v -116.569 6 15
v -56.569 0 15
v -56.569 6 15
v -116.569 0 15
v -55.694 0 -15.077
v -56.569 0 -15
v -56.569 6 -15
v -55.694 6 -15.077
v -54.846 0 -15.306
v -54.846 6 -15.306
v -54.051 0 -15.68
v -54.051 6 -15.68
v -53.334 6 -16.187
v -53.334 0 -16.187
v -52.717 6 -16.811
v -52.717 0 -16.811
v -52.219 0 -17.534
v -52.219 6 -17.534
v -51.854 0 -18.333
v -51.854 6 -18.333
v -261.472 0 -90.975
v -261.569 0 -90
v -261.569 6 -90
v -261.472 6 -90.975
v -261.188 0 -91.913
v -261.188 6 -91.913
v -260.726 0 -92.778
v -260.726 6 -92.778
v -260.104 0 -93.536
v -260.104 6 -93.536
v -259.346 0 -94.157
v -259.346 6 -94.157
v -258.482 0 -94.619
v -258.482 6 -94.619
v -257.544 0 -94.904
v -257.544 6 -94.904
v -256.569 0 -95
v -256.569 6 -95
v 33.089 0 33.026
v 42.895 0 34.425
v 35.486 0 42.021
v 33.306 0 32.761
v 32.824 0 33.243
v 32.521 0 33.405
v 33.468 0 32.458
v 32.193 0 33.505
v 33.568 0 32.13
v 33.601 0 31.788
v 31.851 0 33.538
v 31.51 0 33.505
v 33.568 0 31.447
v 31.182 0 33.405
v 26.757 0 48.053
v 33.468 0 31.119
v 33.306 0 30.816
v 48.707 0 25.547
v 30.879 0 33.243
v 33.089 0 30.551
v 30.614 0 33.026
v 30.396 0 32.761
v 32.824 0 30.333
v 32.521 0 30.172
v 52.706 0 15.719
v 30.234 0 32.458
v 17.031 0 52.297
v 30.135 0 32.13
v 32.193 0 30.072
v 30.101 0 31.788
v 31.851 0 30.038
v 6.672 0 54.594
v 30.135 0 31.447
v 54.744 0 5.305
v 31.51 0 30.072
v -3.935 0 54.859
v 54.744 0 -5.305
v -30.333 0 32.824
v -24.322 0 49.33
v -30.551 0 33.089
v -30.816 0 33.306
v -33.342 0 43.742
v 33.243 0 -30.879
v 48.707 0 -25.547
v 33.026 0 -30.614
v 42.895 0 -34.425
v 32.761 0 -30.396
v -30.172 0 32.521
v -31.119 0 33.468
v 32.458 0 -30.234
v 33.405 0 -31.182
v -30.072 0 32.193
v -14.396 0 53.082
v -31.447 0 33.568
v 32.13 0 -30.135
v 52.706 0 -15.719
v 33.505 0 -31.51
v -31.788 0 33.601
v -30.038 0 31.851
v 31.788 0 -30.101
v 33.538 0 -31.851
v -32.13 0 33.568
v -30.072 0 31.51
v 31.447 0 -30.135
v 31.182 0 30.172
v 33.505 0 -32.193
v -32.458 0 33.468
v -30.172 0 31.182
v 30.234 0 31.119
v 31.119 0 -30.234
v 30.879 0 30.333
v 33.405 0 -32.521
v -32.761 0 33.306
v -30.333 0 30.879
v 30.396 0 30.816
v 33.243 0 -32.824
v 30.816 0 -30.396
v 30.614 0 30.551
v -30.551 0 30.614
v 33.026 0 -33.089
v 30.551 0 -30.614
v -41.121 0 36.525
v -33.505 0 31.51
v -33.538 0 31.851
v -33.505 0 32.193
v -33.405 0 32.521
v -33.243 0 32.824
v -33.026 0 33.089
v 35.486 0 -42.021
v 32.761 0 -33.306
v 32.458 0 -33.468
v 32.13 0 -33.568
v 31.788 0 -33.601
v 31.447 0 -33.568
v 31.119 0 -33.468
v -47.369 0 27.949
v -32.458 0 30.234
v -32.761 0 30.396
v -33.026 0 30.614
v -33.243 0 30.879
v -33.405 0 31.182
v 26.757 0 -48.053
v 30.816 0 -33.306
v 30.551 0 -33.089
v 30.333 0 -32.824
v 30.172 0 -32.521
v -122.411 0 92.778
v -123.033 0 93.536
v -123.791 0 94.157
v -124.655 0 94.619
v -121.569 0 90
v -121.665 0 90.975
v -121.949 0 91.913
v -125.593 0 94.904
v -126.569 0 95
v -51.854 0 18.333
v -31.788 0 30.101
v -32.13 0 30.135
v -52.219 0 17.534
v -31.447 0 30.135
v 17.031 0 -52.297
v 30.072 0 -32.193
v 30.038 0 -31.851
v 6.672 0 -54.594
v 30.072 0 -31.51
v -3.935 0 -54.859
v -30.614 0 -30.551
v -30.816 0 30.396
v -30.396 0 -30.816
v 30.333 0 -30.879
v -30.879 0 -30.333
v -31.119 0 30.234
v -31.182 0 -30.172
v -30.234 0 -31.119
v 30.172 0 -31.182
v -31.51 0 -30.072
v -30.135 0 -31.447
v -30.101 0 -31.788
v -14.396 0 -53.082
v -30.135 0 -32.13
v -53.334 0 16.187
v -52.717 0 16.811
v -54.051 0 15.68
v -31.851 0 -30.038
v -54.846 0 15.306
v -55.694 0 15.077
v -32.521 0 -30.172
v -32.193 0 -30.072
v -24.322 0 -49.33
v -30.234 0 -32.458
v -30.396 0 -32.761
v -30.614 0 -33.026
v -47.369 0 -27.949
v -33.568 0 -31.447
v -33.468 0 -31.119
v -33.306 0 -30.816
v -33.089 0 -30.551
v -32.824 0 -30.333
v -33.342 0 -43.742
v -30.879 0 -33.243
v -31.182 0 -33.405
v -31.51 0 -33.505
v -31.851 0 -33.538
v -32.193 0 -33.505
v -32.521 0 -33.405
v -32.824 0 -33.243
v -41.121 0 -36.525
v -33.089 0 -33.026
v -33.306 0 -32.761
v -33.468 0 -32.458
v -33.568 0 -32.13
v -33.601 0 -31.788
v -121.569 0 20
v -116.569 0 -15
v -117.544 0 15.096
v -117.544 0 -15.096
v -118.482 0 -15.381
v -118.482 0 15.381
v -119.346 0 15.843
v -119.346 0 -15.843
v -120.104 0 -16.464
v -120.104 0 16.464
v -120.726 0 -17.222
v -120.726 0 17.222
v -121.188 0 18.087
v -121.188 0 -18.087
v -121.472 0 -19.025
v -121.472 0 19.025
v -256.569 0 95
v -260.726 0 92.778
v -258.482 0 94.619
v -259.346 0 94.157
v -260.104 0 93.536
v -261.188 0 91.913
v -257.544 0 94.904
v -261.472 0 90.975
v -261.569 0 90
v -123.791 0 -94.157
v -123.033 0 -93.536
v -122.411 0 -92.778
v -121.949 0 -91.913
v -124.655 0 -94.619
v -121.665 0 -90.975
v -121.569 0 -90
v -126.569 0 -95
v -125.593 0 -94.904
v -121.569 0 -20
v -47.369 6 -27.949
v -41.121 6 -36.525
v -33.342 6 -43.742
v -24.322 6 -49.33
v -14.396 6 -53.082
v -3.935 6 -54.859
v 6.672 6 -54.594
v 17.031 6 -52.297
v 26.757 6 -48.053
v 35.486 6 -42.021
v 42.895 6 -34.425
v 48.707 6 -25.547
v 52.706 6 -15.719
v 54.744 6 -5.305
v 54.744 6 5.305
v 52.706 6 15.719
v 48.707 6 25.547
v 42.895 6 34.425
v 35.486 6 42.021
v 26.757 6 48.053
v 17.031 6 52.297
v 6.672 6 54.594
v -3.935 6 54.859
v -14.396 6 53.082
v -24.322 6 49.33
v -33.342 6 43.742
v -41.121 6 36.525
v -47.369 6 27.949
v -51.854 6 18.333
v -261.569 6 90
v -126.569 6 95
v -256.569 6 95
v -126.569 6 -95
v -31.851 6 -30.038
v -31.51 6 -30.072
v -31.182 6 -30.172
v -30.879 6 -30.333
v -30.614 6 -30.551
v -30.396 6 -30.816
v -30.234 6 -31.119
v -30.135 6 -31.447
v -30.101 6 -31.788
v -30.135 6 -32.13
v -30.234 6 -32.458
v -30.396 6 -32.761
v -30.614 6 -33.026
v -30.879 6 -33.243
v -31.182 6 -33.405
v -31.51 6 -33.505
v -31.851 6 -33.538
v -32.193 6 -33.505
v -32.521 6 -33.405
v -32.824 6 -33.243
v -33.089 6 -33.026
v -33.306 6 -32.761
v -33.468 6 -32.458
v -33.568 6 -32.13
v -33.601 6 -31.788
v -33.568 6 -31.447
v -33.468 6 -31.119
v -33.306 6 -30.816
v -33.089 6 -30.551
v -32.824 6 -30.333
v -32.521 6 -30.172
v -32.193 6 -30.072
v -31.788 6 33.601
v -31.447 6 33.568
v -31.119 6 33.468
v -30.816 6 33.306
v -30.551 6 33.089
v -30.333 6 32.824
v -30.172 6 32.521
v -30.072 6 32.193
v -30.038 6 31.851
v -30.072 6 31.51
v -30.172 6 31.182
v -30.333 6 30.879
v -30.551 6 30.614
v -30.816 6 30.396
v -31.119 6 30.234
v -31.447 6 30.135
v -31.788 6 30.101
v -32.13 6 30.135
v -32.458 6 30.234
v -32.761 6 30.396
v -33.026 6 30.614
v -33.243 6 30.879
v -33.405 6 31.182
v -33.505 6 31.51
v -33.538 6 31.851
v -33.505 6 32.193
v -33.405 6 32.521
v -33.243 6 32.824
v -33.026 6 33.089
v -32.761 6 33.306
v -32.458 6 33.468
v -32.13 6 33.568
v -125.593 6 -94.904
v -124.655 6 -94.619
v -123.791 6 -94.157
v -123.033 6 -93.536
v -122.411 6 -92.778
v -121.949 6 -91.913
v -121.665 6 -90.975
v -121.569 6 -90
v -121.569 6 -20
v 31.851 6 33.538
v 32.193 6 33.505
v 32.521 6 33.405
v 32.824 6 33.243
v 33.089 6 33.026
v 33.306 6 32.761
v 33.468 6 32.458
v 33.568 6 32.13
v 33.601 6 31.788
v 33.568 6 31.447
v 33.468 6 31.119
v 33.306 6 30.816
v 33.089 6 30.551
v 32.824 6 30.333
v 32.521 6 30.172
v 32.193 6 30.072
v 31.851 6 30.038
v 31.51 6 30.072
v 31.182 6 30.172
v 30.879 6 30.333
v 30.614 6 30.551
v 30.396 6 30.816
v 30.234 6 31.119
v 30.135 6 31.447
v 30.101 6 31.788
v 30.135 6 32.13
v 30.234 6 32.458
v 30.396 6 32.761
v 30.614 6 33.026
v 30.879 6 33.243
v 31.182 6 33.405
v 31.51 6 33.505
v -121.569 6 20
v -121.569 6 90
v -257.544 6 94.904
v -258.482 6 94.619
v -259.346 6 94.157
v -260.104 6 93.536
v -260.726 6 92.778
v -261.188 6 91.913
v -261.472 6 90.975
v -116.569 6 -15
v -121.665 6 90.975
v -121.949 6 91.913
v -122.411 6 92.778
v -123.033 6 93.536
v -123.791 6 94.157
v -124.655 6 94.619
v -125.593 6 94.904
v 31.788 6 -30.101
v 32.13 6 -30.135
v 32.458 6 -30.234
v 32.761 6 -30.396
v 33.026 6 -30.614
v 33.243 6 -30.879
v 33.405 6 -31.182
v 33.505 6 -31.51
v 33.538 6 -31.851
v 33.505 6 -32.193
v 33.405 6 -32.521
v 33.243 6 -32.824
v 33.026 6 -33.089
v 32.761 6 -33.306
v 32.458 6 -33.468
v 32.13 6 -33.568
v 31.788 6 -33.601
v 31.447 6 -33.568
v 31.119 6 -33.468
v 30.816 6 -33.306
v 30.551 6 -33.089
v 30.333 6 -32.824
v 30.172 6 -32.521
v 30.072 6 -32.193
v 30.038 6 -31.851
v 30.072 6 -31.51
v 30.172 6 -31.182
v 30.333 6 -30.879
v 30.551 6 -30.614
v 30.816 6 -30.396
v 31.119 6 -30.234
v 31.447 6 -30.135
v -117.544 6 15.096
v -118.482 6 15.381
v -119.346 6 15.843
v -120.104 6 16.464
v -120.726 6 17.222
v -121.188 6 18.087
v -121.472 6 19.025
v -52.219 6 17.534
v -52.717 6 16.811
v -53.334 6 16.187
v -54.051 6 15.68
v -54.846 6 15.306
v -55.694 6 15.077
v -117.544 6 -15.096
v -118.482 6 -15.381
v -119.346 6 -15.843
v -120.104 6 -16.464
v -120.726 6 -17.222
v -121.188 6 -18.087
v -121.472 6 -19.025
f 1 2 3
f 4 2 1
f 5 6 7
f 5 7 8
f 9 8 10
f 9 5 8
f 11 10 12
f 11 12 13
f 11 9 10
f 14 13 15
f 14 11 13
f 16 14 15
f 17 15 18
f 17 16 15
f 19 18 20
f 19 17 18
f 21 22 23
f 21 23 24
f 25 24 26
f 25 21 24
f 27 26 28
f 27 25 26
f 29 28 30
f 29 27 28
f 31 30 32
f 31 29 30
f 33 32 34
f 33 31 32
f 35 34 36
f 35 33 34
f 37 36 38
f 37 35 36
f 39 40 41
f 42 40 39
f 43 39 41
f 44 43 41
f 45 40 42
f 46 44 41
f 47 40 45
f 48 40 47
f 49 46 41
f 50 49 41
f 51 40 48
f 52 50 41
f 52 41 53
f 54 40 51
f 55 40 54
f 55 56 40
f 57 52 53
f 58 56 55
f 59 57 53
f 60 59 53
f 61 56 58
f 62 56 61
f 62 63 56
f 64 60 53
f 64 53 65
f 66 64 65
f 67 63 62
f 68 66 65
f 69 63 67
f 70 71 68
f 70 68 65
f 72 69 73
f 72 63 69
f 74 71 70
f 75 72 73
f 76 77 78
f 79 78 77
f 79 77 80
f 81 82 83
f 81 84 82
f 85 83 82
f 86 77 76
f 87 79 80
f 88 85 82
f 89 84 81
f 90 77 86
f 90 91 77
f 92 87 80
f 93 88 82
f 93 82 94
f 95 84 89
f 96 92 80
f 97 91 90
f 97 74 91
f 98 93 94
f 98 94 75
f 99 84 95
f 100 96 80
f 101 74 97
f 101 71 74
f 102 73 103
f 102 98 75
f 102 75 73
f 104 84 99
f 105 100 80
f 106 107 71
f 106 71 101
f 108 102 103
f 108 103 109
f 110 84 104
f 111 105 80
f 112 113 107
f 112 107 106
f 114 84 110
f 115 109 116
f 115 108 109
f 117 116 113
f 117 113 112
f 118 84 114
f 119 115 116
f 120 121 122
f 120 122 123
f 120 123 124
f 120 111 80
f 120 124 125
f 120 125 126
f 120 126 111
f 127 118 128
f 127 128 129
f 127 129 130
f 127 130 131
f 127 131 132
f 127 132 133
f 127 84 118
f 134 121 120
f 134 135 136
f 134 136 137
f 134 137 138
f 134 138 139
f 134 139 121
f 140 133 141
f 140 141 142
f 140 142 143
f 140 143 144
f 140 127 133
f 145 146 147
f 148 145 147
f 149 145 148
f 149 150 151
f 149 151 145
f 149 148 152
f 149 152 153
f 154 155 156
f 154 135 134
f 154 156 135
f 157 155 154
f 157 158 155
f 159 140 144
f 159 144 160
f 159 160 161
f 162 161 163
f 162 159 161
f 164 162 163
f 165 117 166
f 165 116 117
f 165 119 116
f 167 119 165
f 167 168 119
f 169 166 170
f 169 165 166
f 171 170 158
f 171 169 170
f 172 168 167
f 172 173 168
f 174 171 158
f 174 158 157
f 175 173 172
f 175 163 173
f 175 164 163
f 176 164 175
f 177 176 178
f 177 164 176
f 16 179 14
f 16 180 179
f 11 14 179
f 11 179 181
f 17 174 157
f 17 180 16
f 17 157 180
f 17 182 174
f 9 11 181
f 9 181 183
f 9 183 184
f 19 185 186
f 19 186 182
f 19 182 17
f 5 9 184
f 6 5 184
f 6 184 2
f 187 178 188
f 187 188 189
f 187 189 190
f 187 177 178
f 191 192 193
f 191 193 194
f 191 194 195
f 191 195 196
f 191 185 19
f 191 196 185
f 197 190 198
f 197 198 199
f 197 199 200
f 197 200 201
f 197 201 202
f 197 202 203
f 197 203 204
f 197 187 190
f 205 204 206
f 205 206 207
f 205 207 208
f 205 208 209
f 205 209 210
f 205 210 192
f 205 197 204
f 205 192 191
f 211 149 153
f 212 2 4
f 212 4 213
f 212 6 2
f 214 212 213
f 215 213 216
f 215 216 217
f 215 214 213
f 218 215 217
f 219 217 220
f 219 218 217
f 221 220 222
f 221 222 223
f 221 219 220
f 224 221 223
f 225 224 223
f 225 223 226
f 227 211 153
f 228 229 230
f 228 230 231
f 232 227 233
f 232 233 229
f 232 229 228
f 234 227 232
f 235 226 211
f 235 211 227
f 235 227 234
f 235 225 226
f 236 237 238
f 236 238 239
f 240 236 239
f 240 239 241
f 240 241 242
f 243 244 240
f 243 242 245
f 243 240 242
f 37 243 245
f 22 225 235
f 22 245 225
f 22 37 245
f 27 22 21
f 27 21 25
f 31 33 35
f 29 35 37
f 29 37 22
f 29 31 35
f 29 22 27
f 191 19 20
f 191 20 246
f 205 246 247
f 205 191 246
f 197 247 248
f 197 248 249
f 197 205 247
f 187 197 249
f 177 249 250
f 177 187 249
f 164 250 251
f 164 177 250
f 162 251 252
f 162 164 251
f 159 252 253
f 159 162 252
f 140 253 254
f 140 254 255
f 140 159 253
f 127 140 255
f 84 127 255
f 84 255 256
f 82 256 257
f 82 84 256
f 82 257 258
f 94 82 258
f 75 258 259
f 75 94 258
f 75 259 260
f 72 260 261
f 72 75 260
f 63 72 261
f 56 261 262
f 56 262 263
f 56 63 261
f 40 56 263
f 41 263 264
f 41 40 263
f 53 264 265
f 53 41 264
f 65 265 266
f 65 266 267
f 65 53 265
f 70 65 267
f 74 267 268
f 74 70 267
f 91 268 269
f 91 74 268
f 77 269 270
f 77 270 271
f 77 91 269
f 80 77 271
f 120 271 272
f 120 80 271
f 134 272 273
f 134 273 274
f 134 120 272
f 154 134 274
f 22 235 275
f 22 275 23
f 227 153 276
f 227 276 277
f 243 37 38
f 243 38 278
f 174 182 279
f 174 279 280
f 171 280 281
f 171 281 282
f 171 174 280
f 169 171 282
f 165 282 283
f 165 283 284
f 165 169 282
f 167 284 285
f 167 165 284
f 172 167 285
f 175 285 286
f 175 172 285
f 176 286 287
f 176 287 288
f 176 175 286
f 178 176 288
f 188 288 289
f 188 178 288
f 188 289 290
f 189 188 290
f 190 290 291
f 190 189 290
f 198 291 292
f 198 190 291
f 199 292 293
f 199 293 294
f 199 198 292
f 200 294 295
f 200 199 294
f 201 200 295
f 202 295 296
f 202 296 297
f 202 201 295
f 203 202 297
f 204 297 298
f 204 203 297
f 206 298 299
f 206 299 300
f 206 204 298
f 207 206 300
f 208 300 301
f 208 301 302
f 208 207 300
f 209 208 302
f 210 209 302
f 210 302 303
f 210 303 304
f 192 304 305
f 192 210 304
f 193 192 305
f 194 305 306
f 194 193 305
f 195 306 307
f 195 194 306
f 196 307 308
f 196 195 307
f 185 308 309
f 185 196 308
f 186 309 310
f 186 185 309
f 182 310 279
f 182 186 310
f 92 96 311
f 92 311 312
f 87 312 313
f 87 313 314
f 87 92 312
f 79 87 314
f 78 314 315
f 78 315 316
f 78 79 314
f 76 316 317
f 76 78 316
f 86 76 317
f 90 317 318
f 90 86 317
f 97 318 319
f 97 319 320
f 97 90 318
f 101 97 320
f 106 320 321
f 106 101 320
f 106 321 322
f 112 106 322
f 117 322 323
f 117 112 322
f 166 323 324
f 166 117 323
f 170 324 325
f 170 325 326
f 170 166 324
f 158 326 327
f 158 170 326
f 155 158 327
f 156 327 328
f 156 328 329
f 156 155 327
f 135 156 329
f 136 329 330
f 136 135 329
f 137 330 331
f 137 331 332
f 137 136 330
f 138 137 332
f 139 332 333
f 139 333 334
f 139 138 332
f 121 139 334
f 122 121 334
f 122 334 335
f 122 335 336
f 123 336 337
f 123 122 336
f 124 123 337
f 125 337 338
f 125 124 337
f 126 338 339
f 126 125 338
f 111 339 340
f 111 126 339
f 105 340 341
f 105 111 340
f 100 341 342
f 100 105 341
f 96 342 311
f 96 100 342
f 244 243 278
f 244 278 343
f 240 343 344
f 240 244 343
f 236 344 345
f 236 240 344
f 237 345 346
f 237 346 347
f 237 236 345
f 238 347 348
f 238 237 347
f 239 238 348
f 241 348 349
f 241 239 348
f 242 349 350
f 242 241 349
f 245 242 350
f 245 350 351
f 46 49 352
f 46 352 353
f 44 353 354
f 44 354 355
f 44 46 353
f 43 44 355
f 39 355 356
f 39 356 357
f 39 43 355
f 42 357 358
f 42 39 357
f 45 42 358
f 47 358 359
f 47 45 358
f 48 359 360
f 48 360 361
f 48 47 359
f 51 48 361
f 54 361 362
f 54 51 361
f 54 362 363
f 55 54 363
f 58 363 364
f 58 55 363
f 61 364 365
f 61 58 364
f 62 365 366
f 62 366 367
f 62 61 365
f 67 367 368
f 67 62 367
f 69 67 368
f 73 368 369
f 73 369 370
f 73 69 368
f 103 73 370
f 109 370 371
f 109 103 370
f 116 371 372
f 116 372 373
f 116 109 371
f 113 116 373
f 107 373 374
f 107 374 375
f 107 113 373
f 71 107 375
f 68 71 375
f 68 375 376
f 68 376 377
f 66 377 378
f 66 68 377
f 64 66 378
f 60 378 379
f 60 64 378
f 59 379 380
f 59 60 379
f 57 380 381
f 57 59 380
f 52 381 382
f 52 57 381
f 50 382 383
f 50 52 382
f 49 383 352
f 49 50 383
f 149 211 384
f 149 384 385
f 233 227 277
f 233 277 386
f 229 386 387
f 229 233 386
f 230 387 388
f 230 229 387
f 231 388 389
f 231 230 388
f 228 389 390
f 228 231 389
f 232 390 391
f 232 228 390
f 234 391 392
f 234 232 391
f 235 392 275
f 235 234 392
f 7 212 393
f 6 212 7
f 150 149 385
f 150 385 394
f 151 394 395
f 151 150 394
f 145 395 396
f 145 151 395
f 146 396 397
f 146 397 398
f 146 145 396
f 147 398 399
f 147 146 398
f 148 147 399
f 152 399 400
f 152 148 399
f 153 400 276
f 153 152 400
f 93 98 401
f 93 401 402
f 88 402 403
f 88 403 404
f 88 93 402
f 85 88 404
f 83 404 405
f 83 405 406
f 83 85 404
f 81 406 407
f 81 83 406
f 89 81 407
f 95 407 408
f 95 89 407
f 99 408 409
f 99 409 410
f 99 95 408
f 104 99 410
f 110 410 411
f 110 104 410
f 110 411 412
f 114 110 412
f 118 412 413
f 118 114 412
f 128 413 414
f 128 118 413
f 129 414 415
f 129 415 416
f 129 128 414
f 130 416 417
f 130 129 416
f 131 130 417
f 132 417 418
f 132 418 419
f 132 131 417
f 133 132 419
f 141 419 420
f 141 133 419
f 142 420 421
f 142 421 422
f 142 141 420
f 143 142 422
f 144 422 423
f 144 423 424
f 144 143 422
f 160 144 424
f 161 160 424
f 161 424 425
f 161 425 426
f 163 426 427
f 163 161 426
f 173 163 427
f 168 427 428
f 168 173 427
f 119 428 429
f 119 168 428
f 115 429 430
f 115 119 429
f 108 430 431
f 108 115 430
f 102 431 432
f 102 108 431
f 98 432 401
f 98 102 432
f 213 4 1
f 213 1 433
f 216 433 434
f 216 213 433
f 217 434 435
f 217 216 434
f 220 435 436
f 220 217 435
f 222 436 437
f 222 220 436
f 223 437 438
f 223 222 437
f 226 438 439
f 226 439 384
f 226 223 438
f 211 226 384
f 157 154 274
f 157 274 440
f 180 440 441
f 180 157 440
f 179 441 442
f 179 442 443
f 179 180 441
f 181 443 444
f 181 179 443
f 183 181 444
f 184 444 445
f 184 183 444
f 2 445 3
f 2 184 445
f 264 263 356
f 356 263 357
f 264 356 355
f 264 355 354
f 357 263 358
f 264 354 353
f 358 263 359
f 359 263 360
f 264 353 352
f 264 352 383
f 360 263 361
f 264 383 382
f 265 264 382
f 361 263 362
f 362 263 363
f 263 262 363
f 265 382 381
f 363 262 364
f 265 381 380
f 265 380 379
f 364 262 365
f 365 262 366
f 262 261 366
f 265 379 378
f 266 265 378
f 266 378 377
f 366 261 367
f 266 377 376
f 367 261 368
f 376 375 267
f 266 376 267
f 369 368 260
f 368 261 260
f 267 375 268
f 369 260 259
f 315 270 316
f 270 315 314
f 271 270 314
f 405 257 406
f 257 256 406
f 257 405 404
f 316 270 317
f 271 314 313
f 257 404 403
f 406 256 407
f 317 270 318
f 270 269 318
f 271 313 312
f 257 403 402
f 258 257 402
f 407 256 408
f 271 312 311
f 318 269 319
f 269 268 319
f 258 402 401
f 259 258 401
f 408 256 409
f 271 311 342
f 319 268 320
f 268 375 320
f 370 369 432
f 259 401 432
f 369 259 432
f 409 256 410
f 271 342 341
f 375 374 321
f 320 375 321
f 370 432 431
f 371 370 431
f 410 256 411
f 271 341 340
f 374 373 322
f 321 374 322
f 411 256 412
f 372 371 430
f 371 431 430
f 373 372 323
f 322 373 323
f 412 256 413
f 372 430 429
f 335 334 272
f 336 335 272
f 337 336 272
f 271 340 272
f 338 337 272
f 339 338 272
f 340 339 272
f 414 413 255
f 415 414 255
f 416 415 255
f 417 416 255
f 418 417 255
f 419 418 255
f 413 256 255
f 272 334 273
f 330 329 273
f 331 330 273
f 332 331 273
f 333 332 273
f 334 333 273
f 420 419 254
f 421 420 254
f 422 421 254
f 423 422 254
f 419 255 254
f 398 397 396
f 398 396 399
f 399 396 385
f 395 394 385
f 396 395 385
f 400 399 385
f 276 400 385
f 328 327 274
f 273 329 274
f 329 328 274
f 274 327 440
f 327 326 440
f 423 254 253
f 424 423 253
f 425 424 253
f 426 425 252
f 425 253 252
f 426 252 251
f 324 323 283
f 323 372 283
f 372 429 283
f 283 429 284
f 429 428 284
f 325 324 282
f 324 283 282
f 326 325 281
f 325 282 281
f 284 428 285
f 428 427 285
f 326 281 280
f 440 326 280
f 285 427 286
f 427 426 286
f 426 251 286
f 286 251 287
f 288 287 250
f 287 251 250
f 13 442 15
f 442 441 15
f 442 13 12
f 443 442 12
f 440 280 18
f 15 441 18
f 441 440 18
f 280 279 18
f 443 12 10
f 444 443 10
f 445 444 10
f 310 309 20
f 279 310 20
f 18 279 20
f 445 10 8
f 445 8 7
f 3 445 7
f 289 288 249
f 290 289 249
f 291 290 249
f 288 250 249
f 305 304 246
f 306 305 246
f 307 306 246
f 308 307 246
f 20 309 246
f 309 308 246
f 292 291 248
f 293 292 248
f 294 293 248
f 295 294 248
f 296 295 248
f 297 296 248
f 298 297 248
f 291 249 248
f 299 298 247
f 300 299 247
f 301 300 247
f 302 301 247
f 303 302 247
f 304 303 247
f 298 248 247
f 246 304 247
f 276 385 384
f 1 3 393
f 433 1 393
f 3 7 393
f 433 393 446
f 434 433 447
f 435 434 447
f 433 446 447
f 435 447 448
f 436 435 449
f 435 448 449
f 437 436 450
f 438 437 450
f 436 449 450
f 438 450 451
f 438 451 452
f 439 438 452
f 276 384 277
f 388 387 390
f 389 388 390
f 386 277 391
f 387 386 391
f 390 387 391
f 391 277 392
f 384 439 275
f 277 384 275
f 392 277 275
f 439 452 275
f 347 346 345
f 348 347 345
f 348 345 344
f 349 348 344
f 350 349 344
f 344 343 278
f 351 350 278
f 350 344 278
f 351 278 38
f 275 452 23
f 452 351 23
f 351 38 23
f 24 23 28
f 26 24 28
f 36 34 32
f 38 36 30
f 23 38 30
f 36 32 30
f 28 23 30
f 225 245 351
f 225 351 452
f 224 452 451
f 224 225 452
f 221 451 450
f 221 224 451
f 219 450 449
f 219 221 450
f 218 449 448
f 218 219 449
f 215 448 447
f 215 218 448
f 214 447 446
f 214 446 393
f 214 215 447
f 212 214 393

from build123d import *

# Parameters (mm, degrees)
SKETCH1_R           = 1.75
BOSS_EXTRUDE1_DEPTH = 6


with BuildPart() as part:
    # Sketch1 → Boss-Extrude1 (new body)
    with BuildSketch(Plane(origin=(0, 0, 0), x_dir=(1, 0, 0), z_dir=(0, 1, 0))):
        with BuildLine():
            Line((-56.568542495, -15), (-116.568542495, -15))
            ThreePointArc((-116.568542495, -15), (-120.104076401, -16.464466094), (-121.568542495, -20))
            Line((-121.568542495, -20), (-121.568542495, -90))
            ThreePointArc((-121.568542495, -90), (-123.033008589, -93.535533906), (-126.568542495, -95))
            Line((-126.568542495, -95), (-256.568542495, -95))
            ThreePointArc((-256.568542495, -95), (-260.104076401, -93.535533906), (-261.568542495, -90))
            Line((-261.568542495, -90), (-261.568542495, 90))
            ThreePointArc((-261.568542495, 90), (-260.104076401, 93.535533906), (-256.568542495, 95))
            Line((-256.568542495, 95), (-126.568542495, 95))
            ThreePointArc((-126.568542495, 95), (-123.033008589, 93.535533906), (-121.568542495, 90))
            Line((-121.568542495, 90), (-121.568542495, 20))
            ThreePointArc((-121.568542495, 20), (-120.104076401, 16.464466094), (-116.568542495, 15))
            Line((-116.568542495, 15), (-56.568542495, 15))
            ThreePointArc((-56.568542495, 15), (-53.681791149, 15.917517095), (-51.854497287, 18.333333333))
            ThreePointArc((-51.854497287, 18.333333333), (55, 0), (-51.854497287, -18.333333333))
            ThreePointArc((-51.854497287, -18.333333333), (-53.681791149, -15.917517095), (-56.568542495, -15))
        make_face()
        with Locations(Location((31.851272196, -31.788306962, 0), (0, 0, 270))):
            Circle(SKETCH1_R, mode=Mode.SUBTRACT)
        with Locations(Location((31.788306962, 31.851272196, 0), (0, 0, 270))):
            Circle(SKETCH1_R, mode=Mode.SUBTRACT)
        with Locations(Location((-31.851272196, 31.788306962, 0), (0, 0, 270))):
            Circle(SKETCH1_R, mode=Mode.SUBTRACT)
        with Locations(Location((-31.788306962, -31.851272196, 0), (0, 0, 270))):
            Circle(SKETCH1_R, mode=Mode.SUBTRACT)
    extrude(amount=BOSS_EXTRUDE1_DEPTH)


solid = part.part
